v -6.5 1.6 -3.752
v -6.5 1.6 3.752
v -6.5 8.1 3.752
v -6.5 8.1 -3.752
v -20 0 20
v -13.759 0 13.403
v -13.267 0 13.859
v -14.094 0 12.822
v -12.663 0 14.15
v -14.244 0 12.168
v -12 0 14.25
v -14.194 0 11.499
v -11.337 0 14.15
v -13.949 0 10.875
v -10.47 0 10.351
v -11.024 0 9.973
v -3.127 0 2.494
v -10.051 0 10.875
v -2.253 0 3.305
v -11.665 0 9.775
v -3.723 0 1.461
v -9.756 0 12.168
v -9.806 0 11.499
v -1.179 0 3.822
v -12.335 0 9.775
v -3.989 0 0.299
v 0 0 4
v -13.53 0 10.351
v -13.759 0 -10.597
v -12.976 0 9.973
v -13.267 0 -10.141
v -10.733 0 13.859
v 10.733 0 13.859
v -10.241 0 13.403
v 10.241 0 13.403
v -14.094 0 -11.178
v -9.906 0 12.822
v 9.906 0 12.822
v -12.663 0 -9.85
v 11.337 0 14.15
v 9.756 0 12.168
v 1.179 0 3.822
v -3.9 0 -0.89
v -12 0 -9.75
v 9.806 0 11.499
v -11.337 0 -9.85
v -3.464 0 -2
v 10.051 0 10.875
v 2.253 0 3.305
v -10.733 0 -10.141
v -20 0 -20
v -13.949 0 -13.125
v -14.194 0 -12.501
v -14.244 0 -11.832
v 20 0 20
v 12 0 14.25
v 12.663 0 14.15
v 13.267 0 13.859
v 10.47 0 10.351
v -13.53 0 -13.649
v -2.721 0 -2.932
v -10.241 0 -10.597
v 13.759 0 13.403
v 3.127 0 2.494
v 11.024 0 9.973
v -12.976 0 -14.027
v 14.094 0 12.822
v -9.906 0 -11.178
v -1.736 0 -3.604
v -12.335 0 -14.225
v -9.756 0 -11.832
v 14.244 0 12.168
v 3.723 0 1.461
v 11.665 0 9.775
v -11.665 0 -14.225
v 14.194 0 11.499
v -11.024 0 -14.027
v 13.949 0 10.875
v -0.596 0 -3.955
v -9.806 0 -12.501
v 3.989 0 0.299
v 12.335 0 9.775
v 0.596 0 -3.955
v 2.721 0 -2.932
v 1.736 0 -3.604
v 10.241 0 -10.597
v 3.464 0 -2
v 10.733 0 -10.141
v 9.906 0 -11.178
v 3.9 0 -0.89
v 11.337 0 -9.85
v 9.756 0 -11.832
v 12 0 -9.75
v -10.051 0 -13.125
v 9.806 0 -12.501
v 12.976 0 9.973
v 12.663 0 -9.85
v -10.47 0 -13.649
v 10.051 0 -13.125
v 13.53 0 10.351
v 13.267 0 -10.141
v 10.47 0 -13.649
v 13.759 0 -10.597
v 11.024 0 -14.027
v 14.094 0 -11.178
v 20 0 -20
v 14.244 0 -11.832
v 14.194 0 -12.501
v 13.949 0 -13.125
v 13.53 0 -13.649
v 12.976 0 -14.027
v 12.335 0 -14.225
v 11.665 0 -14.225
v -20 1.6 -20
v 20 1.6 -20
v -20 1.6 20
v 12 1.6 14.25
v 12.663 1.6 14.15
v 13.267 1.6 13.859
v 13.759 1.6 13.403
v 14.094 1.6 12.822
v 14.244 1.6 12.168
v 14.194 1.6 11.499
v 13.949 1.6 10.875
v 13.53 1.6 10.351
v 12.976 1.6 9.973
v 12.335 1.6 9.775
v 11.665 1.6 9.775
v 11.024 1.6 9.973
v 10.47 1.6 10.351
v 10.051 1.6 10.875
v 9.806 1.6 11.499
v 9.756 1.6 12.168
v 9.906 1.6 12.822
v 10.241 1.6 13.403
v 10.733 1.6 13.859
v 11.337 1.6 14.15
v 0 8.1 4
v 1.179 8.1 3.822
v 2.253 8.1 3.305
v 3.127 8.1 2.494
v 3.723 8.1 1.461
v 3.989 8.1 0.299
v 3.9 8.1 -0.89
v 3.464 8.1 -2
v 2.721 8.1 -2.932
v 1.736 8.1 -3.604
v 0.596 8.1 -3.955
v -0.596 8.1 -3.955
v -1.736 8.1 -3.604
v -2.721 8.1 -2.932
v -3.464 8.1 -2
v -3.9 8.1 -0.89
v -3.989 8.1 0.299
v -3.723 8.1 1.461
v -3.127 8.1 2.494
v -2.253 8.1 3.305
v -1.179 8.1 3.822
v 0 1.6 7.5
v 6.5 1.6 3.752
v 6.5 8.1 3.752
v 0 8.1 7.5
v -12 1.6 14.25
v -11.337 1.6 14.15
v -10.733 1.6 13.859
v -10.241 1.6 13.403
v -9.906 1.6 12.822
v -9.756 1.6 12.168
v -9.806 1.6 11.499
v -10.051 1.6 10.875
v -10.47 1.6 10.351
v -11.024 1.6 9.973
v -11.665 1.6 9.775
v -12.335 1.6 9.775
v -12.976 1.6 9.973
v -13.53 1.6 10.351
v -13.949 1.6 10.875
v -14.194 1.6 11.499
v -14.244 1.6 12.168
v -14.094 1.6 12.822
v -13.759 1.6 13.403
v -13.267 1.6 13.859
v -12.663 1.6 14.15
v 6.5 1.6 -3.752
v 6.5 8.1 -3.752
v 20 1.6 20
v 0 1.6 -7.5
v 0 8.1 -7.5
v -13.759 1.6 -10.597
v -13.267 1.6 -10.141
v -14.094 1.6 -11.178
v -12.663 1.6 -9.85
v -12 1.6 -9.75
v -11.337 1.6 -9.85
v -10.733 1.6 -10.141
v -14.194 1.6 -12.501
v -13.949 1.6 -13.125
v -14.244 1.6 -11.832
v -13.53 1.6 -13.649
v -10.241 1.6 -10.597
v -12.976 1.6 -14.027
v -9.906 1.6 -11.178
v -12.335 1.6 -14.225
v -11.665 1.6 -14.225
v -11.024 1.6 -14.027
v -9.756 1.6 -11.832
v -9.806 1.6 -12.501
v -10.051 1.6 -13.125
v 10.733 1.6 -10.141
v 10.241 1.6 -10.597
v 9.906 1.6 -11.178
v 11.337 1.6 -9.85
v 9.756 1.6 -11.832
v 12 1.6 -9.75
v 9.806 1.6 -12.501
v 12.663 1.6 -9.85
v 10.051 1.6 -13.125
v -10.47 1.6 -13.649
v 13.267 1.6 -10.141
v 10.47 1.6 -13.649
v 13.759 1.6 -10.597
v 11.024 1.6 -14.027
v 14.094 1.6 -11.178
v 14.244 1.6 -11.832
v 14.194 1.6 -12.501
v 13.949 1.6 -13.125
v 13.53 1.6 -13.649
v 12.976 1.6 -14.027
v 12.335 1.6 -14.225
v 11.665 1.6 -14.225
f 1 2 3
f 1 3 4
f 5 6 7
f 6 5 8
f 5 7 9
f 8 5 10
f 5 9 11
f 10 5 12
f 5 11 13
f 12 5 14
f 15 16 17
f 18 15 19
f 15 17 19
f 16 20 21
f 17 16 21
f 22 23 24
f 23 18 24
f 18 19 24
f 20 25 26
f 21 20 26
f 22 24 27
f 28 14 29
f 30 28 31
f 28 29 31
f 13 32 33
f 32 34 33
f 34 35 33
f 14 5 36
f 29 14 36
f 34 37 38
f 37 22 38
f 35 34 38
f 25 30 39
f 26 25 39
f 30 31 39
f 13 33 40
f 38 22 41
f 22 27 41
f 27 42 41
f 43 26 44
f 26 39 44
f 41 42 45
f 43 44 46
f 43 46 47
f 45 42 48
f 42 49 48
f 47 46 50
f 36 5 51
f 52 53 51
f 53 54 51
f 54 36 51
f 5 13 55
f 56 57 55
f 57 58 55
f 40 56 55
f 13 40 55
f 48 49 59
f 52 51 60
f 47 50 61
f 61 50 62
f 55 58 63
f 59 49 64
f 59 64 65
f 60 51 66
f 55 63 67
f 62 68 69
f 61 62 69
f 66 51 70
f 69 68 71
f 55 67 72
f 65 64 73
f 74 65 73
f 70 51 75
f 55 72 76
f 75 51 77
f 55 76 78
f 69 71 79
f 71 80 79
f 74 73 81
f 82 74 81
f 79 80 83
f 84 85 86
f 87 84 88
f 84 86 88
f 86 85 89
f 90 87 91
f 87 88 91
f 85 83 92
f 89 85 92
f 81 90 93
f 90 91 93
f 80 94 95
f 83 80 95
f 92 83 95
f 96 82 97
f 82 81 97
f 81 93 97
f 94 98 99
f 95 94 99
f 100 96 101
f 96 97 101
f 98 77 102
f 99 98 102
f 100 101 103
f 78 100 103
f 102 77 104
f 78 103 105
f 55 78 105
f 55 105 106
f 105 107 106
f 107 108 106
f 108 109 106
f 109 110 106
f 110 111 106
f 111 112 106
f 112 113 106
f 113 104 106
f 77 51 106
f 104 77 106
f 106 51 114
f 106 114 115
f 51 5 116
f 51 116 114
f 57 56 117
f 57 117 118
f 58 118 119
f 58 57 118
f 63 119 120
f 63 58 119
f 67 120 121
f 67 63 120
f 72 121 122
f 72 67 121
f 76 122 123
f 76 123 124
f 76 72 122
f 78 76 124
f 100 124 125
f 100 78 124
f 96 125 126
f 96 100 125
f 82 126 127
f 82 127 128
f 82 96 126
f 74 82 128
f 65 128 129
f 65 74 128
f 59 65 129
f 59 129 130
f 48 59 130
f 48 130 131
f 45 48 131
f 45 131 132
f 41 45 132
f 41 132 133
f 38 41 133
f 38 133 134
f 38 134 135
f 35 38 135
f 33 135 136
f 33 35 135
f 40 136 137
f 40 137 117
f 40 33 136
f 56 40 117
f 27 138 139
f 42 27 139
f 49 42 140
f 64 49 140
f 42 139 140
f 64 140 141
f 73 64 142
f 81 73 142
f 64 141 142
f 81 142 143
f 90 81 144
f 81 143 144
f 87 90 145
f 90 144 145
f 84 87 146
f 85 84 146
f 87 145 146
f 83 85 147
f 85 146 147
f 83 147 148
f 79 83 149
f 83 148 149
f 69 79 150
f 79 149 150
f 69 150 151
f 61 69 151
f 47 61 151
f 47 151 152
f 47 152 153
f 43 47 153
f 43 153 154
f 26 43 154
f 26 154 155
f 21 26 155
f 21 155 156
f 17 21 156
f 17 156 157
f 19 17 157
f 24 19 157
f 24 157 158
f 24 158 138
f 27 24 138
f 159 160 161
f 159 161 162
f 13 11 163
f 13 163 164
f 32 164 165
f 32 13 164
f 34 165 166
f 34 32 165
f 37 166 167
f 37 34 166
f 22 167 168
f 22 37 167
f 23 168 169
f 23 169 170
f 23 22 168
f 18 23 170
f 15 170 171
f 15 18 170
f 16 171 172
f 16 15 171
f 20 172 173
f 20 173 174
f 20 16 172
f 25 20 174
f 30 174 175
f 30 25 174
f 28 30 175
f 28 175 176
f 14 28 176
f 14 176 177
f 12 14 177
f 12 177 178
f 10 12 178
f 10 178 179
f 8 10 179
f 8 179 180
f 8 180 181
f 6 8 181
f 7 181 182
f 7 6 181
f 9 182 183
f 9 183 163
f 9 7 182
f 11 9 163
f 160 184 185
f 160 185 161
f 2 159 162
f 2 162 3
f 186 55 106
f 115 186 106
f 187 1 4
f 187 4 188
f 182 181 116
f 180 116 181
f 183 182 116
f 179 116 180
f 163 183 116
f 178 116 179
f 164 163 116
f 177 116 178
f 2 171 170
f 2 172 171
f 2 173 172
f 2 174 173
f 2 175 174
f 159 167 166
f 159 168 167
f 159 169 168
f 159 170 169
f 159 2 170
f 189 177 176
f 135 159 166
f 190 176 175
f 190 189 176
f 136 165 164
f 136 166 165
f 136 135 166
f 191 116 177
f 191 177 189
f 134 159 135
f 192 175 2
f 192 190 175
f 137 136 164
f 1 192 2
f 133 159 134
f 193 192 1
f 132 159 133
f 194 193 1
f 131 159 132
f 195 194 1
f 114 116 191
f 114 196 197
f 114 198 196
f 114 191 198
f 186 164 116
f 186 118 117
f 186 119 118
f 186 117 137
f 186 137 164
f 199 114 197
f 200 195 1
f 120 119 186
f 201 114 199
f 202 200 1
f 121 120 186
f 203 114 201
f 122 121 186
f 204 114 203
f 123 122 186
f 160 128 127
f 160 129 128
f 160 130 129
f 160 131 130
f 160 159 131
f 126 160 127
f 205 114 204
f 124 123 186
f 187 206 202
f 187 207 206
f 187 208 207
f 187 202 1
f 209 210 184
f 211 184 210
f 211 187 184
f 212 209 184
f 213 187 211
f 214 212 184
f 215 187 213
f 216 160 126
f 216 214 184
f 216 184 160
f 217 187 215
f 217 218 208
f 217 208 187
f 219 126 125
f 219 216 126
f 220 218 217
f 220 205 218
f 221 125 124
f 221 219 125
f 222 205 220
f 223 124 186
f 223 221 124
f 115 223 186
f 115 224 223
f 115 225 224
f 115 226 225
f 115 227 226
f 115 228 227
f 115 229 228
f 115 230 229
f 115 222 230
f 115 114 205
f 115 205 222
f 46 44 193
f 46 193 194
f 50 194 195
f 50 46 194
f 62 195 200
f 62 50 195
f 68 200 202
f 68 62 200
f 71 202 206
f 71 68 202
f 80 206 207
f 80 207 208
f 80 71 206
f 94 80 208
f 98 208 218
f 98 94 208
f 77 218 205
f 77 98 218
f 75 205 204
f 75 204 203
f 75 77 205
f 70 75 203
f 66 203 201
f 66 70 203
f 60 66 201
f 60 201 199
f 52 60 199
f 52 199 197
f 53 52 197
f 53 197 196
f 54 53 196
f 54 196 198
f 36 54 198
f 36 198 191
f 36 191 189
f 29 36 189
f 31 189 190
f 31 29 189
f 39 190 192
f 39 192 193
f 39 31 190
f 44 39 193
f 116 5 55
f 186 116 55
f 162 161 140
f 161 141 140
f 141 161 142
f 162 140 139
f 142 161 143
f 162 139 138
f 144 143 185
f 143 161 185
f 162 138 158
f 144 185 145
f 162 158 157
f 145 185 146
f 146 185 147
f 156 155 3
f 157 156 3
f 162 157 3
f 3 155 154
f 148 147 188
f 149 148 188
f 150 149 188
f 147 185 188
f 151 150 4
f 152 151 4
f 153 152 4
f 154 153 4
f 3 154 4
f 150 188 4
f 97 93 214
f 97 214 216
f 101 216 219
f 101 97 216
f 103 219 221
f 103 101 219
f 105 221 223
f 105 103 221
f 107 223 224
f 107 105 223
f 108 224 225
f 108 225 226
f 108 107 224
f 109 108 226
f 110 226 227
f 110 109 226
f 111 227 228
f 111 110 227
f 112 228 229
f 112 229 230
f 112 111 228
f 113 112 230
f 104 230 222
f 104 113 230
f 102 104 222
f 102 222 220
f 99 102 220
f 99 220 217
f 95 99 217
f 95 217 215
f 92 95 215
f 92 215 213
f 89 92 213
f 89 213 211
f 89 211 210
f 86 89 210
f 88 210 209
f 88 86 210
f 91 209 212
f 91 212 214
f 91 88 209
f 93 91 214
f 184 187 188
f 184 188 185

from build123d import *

# Parameters (mm, degrees)
SKETCH_1_W          = 40
SKETCH_1_H          = 40
SKETCH_1_R          = 2.25
EXTRUDE_1_DEPTH     = 1.6
EXTRUDE_2_DEPTH     = 6.5
SKETCH_3_R          = 4
CUT_EXTRUDE_1_DEPTH = 30.421250823


with BuildPart() as part:
    # ｽｹｯﾁ1 → ﾎﾞｽ - 押し出し1 (new body)
    with BuildSketch(Plane(origin=(0, 0, 0), x_dir=(1, 0, 0), z_dir=(0, 1, 0))):
        Rectangle(SKETCH_1_W, SKETCH_1_H)
        with Locations(Location((-12, 12, 0), (0, 0, 270))):
            Circle(SKETCH_1_R, mode=Mode.SUBTRACT)
        with Locations(Location((12, 12, 0), (0, 0, 270))):
            Circle(SKETCH_1_R, mode=Mode.SUBTRACT)
        with Locations(Location((-12, -12, 0), (0, 0, 270))):
            Circle(SKETCH_1_R, mode=Mode.SUBTRACT)
        with Locations(Location((12, -12, 0), (0, 0, 270))):
            Circle(SKETCH_1_R, mode=Mode.SUBTRACT)
    extrude(amount=EXTRUDE_1_DEPTH)

    # ｽｹｯﾁ2 → ﾎﾞｽ - 押し出し2 (add)
    with BuildSketch(Plane(origin=(0, 1.6, 0), x_dir=(1, 0, 0), z_dir=(0, 1, 0))):
        Polygon((0, 7.5), (6.5, 3.751666445), (6.5, -3.751666445), (0, -7.5), (-6.5, -3.751666445), (-6.5, 3.751666445), align=None)
    extrude(amount=EXTRUDE_2_DEPTH)

    # ｽｹｯﾁ3 → ｶｯﾄ - 押し出し1 (cut, through all)
    with BuildSketch(Plane(origin=(0, 8.1, 0), x_dir=(1, 0, 0), z_dir=(0, 1, 0))):
        with Locations(Location((0, 0, 0), (0, 0, 270))):
            Circle(SKETCH_3_R)
    extrude(amount=-CUT_EXTRUDE_1_DEPTH, mode=Mode.SUBTRACT)


solid = part.part
